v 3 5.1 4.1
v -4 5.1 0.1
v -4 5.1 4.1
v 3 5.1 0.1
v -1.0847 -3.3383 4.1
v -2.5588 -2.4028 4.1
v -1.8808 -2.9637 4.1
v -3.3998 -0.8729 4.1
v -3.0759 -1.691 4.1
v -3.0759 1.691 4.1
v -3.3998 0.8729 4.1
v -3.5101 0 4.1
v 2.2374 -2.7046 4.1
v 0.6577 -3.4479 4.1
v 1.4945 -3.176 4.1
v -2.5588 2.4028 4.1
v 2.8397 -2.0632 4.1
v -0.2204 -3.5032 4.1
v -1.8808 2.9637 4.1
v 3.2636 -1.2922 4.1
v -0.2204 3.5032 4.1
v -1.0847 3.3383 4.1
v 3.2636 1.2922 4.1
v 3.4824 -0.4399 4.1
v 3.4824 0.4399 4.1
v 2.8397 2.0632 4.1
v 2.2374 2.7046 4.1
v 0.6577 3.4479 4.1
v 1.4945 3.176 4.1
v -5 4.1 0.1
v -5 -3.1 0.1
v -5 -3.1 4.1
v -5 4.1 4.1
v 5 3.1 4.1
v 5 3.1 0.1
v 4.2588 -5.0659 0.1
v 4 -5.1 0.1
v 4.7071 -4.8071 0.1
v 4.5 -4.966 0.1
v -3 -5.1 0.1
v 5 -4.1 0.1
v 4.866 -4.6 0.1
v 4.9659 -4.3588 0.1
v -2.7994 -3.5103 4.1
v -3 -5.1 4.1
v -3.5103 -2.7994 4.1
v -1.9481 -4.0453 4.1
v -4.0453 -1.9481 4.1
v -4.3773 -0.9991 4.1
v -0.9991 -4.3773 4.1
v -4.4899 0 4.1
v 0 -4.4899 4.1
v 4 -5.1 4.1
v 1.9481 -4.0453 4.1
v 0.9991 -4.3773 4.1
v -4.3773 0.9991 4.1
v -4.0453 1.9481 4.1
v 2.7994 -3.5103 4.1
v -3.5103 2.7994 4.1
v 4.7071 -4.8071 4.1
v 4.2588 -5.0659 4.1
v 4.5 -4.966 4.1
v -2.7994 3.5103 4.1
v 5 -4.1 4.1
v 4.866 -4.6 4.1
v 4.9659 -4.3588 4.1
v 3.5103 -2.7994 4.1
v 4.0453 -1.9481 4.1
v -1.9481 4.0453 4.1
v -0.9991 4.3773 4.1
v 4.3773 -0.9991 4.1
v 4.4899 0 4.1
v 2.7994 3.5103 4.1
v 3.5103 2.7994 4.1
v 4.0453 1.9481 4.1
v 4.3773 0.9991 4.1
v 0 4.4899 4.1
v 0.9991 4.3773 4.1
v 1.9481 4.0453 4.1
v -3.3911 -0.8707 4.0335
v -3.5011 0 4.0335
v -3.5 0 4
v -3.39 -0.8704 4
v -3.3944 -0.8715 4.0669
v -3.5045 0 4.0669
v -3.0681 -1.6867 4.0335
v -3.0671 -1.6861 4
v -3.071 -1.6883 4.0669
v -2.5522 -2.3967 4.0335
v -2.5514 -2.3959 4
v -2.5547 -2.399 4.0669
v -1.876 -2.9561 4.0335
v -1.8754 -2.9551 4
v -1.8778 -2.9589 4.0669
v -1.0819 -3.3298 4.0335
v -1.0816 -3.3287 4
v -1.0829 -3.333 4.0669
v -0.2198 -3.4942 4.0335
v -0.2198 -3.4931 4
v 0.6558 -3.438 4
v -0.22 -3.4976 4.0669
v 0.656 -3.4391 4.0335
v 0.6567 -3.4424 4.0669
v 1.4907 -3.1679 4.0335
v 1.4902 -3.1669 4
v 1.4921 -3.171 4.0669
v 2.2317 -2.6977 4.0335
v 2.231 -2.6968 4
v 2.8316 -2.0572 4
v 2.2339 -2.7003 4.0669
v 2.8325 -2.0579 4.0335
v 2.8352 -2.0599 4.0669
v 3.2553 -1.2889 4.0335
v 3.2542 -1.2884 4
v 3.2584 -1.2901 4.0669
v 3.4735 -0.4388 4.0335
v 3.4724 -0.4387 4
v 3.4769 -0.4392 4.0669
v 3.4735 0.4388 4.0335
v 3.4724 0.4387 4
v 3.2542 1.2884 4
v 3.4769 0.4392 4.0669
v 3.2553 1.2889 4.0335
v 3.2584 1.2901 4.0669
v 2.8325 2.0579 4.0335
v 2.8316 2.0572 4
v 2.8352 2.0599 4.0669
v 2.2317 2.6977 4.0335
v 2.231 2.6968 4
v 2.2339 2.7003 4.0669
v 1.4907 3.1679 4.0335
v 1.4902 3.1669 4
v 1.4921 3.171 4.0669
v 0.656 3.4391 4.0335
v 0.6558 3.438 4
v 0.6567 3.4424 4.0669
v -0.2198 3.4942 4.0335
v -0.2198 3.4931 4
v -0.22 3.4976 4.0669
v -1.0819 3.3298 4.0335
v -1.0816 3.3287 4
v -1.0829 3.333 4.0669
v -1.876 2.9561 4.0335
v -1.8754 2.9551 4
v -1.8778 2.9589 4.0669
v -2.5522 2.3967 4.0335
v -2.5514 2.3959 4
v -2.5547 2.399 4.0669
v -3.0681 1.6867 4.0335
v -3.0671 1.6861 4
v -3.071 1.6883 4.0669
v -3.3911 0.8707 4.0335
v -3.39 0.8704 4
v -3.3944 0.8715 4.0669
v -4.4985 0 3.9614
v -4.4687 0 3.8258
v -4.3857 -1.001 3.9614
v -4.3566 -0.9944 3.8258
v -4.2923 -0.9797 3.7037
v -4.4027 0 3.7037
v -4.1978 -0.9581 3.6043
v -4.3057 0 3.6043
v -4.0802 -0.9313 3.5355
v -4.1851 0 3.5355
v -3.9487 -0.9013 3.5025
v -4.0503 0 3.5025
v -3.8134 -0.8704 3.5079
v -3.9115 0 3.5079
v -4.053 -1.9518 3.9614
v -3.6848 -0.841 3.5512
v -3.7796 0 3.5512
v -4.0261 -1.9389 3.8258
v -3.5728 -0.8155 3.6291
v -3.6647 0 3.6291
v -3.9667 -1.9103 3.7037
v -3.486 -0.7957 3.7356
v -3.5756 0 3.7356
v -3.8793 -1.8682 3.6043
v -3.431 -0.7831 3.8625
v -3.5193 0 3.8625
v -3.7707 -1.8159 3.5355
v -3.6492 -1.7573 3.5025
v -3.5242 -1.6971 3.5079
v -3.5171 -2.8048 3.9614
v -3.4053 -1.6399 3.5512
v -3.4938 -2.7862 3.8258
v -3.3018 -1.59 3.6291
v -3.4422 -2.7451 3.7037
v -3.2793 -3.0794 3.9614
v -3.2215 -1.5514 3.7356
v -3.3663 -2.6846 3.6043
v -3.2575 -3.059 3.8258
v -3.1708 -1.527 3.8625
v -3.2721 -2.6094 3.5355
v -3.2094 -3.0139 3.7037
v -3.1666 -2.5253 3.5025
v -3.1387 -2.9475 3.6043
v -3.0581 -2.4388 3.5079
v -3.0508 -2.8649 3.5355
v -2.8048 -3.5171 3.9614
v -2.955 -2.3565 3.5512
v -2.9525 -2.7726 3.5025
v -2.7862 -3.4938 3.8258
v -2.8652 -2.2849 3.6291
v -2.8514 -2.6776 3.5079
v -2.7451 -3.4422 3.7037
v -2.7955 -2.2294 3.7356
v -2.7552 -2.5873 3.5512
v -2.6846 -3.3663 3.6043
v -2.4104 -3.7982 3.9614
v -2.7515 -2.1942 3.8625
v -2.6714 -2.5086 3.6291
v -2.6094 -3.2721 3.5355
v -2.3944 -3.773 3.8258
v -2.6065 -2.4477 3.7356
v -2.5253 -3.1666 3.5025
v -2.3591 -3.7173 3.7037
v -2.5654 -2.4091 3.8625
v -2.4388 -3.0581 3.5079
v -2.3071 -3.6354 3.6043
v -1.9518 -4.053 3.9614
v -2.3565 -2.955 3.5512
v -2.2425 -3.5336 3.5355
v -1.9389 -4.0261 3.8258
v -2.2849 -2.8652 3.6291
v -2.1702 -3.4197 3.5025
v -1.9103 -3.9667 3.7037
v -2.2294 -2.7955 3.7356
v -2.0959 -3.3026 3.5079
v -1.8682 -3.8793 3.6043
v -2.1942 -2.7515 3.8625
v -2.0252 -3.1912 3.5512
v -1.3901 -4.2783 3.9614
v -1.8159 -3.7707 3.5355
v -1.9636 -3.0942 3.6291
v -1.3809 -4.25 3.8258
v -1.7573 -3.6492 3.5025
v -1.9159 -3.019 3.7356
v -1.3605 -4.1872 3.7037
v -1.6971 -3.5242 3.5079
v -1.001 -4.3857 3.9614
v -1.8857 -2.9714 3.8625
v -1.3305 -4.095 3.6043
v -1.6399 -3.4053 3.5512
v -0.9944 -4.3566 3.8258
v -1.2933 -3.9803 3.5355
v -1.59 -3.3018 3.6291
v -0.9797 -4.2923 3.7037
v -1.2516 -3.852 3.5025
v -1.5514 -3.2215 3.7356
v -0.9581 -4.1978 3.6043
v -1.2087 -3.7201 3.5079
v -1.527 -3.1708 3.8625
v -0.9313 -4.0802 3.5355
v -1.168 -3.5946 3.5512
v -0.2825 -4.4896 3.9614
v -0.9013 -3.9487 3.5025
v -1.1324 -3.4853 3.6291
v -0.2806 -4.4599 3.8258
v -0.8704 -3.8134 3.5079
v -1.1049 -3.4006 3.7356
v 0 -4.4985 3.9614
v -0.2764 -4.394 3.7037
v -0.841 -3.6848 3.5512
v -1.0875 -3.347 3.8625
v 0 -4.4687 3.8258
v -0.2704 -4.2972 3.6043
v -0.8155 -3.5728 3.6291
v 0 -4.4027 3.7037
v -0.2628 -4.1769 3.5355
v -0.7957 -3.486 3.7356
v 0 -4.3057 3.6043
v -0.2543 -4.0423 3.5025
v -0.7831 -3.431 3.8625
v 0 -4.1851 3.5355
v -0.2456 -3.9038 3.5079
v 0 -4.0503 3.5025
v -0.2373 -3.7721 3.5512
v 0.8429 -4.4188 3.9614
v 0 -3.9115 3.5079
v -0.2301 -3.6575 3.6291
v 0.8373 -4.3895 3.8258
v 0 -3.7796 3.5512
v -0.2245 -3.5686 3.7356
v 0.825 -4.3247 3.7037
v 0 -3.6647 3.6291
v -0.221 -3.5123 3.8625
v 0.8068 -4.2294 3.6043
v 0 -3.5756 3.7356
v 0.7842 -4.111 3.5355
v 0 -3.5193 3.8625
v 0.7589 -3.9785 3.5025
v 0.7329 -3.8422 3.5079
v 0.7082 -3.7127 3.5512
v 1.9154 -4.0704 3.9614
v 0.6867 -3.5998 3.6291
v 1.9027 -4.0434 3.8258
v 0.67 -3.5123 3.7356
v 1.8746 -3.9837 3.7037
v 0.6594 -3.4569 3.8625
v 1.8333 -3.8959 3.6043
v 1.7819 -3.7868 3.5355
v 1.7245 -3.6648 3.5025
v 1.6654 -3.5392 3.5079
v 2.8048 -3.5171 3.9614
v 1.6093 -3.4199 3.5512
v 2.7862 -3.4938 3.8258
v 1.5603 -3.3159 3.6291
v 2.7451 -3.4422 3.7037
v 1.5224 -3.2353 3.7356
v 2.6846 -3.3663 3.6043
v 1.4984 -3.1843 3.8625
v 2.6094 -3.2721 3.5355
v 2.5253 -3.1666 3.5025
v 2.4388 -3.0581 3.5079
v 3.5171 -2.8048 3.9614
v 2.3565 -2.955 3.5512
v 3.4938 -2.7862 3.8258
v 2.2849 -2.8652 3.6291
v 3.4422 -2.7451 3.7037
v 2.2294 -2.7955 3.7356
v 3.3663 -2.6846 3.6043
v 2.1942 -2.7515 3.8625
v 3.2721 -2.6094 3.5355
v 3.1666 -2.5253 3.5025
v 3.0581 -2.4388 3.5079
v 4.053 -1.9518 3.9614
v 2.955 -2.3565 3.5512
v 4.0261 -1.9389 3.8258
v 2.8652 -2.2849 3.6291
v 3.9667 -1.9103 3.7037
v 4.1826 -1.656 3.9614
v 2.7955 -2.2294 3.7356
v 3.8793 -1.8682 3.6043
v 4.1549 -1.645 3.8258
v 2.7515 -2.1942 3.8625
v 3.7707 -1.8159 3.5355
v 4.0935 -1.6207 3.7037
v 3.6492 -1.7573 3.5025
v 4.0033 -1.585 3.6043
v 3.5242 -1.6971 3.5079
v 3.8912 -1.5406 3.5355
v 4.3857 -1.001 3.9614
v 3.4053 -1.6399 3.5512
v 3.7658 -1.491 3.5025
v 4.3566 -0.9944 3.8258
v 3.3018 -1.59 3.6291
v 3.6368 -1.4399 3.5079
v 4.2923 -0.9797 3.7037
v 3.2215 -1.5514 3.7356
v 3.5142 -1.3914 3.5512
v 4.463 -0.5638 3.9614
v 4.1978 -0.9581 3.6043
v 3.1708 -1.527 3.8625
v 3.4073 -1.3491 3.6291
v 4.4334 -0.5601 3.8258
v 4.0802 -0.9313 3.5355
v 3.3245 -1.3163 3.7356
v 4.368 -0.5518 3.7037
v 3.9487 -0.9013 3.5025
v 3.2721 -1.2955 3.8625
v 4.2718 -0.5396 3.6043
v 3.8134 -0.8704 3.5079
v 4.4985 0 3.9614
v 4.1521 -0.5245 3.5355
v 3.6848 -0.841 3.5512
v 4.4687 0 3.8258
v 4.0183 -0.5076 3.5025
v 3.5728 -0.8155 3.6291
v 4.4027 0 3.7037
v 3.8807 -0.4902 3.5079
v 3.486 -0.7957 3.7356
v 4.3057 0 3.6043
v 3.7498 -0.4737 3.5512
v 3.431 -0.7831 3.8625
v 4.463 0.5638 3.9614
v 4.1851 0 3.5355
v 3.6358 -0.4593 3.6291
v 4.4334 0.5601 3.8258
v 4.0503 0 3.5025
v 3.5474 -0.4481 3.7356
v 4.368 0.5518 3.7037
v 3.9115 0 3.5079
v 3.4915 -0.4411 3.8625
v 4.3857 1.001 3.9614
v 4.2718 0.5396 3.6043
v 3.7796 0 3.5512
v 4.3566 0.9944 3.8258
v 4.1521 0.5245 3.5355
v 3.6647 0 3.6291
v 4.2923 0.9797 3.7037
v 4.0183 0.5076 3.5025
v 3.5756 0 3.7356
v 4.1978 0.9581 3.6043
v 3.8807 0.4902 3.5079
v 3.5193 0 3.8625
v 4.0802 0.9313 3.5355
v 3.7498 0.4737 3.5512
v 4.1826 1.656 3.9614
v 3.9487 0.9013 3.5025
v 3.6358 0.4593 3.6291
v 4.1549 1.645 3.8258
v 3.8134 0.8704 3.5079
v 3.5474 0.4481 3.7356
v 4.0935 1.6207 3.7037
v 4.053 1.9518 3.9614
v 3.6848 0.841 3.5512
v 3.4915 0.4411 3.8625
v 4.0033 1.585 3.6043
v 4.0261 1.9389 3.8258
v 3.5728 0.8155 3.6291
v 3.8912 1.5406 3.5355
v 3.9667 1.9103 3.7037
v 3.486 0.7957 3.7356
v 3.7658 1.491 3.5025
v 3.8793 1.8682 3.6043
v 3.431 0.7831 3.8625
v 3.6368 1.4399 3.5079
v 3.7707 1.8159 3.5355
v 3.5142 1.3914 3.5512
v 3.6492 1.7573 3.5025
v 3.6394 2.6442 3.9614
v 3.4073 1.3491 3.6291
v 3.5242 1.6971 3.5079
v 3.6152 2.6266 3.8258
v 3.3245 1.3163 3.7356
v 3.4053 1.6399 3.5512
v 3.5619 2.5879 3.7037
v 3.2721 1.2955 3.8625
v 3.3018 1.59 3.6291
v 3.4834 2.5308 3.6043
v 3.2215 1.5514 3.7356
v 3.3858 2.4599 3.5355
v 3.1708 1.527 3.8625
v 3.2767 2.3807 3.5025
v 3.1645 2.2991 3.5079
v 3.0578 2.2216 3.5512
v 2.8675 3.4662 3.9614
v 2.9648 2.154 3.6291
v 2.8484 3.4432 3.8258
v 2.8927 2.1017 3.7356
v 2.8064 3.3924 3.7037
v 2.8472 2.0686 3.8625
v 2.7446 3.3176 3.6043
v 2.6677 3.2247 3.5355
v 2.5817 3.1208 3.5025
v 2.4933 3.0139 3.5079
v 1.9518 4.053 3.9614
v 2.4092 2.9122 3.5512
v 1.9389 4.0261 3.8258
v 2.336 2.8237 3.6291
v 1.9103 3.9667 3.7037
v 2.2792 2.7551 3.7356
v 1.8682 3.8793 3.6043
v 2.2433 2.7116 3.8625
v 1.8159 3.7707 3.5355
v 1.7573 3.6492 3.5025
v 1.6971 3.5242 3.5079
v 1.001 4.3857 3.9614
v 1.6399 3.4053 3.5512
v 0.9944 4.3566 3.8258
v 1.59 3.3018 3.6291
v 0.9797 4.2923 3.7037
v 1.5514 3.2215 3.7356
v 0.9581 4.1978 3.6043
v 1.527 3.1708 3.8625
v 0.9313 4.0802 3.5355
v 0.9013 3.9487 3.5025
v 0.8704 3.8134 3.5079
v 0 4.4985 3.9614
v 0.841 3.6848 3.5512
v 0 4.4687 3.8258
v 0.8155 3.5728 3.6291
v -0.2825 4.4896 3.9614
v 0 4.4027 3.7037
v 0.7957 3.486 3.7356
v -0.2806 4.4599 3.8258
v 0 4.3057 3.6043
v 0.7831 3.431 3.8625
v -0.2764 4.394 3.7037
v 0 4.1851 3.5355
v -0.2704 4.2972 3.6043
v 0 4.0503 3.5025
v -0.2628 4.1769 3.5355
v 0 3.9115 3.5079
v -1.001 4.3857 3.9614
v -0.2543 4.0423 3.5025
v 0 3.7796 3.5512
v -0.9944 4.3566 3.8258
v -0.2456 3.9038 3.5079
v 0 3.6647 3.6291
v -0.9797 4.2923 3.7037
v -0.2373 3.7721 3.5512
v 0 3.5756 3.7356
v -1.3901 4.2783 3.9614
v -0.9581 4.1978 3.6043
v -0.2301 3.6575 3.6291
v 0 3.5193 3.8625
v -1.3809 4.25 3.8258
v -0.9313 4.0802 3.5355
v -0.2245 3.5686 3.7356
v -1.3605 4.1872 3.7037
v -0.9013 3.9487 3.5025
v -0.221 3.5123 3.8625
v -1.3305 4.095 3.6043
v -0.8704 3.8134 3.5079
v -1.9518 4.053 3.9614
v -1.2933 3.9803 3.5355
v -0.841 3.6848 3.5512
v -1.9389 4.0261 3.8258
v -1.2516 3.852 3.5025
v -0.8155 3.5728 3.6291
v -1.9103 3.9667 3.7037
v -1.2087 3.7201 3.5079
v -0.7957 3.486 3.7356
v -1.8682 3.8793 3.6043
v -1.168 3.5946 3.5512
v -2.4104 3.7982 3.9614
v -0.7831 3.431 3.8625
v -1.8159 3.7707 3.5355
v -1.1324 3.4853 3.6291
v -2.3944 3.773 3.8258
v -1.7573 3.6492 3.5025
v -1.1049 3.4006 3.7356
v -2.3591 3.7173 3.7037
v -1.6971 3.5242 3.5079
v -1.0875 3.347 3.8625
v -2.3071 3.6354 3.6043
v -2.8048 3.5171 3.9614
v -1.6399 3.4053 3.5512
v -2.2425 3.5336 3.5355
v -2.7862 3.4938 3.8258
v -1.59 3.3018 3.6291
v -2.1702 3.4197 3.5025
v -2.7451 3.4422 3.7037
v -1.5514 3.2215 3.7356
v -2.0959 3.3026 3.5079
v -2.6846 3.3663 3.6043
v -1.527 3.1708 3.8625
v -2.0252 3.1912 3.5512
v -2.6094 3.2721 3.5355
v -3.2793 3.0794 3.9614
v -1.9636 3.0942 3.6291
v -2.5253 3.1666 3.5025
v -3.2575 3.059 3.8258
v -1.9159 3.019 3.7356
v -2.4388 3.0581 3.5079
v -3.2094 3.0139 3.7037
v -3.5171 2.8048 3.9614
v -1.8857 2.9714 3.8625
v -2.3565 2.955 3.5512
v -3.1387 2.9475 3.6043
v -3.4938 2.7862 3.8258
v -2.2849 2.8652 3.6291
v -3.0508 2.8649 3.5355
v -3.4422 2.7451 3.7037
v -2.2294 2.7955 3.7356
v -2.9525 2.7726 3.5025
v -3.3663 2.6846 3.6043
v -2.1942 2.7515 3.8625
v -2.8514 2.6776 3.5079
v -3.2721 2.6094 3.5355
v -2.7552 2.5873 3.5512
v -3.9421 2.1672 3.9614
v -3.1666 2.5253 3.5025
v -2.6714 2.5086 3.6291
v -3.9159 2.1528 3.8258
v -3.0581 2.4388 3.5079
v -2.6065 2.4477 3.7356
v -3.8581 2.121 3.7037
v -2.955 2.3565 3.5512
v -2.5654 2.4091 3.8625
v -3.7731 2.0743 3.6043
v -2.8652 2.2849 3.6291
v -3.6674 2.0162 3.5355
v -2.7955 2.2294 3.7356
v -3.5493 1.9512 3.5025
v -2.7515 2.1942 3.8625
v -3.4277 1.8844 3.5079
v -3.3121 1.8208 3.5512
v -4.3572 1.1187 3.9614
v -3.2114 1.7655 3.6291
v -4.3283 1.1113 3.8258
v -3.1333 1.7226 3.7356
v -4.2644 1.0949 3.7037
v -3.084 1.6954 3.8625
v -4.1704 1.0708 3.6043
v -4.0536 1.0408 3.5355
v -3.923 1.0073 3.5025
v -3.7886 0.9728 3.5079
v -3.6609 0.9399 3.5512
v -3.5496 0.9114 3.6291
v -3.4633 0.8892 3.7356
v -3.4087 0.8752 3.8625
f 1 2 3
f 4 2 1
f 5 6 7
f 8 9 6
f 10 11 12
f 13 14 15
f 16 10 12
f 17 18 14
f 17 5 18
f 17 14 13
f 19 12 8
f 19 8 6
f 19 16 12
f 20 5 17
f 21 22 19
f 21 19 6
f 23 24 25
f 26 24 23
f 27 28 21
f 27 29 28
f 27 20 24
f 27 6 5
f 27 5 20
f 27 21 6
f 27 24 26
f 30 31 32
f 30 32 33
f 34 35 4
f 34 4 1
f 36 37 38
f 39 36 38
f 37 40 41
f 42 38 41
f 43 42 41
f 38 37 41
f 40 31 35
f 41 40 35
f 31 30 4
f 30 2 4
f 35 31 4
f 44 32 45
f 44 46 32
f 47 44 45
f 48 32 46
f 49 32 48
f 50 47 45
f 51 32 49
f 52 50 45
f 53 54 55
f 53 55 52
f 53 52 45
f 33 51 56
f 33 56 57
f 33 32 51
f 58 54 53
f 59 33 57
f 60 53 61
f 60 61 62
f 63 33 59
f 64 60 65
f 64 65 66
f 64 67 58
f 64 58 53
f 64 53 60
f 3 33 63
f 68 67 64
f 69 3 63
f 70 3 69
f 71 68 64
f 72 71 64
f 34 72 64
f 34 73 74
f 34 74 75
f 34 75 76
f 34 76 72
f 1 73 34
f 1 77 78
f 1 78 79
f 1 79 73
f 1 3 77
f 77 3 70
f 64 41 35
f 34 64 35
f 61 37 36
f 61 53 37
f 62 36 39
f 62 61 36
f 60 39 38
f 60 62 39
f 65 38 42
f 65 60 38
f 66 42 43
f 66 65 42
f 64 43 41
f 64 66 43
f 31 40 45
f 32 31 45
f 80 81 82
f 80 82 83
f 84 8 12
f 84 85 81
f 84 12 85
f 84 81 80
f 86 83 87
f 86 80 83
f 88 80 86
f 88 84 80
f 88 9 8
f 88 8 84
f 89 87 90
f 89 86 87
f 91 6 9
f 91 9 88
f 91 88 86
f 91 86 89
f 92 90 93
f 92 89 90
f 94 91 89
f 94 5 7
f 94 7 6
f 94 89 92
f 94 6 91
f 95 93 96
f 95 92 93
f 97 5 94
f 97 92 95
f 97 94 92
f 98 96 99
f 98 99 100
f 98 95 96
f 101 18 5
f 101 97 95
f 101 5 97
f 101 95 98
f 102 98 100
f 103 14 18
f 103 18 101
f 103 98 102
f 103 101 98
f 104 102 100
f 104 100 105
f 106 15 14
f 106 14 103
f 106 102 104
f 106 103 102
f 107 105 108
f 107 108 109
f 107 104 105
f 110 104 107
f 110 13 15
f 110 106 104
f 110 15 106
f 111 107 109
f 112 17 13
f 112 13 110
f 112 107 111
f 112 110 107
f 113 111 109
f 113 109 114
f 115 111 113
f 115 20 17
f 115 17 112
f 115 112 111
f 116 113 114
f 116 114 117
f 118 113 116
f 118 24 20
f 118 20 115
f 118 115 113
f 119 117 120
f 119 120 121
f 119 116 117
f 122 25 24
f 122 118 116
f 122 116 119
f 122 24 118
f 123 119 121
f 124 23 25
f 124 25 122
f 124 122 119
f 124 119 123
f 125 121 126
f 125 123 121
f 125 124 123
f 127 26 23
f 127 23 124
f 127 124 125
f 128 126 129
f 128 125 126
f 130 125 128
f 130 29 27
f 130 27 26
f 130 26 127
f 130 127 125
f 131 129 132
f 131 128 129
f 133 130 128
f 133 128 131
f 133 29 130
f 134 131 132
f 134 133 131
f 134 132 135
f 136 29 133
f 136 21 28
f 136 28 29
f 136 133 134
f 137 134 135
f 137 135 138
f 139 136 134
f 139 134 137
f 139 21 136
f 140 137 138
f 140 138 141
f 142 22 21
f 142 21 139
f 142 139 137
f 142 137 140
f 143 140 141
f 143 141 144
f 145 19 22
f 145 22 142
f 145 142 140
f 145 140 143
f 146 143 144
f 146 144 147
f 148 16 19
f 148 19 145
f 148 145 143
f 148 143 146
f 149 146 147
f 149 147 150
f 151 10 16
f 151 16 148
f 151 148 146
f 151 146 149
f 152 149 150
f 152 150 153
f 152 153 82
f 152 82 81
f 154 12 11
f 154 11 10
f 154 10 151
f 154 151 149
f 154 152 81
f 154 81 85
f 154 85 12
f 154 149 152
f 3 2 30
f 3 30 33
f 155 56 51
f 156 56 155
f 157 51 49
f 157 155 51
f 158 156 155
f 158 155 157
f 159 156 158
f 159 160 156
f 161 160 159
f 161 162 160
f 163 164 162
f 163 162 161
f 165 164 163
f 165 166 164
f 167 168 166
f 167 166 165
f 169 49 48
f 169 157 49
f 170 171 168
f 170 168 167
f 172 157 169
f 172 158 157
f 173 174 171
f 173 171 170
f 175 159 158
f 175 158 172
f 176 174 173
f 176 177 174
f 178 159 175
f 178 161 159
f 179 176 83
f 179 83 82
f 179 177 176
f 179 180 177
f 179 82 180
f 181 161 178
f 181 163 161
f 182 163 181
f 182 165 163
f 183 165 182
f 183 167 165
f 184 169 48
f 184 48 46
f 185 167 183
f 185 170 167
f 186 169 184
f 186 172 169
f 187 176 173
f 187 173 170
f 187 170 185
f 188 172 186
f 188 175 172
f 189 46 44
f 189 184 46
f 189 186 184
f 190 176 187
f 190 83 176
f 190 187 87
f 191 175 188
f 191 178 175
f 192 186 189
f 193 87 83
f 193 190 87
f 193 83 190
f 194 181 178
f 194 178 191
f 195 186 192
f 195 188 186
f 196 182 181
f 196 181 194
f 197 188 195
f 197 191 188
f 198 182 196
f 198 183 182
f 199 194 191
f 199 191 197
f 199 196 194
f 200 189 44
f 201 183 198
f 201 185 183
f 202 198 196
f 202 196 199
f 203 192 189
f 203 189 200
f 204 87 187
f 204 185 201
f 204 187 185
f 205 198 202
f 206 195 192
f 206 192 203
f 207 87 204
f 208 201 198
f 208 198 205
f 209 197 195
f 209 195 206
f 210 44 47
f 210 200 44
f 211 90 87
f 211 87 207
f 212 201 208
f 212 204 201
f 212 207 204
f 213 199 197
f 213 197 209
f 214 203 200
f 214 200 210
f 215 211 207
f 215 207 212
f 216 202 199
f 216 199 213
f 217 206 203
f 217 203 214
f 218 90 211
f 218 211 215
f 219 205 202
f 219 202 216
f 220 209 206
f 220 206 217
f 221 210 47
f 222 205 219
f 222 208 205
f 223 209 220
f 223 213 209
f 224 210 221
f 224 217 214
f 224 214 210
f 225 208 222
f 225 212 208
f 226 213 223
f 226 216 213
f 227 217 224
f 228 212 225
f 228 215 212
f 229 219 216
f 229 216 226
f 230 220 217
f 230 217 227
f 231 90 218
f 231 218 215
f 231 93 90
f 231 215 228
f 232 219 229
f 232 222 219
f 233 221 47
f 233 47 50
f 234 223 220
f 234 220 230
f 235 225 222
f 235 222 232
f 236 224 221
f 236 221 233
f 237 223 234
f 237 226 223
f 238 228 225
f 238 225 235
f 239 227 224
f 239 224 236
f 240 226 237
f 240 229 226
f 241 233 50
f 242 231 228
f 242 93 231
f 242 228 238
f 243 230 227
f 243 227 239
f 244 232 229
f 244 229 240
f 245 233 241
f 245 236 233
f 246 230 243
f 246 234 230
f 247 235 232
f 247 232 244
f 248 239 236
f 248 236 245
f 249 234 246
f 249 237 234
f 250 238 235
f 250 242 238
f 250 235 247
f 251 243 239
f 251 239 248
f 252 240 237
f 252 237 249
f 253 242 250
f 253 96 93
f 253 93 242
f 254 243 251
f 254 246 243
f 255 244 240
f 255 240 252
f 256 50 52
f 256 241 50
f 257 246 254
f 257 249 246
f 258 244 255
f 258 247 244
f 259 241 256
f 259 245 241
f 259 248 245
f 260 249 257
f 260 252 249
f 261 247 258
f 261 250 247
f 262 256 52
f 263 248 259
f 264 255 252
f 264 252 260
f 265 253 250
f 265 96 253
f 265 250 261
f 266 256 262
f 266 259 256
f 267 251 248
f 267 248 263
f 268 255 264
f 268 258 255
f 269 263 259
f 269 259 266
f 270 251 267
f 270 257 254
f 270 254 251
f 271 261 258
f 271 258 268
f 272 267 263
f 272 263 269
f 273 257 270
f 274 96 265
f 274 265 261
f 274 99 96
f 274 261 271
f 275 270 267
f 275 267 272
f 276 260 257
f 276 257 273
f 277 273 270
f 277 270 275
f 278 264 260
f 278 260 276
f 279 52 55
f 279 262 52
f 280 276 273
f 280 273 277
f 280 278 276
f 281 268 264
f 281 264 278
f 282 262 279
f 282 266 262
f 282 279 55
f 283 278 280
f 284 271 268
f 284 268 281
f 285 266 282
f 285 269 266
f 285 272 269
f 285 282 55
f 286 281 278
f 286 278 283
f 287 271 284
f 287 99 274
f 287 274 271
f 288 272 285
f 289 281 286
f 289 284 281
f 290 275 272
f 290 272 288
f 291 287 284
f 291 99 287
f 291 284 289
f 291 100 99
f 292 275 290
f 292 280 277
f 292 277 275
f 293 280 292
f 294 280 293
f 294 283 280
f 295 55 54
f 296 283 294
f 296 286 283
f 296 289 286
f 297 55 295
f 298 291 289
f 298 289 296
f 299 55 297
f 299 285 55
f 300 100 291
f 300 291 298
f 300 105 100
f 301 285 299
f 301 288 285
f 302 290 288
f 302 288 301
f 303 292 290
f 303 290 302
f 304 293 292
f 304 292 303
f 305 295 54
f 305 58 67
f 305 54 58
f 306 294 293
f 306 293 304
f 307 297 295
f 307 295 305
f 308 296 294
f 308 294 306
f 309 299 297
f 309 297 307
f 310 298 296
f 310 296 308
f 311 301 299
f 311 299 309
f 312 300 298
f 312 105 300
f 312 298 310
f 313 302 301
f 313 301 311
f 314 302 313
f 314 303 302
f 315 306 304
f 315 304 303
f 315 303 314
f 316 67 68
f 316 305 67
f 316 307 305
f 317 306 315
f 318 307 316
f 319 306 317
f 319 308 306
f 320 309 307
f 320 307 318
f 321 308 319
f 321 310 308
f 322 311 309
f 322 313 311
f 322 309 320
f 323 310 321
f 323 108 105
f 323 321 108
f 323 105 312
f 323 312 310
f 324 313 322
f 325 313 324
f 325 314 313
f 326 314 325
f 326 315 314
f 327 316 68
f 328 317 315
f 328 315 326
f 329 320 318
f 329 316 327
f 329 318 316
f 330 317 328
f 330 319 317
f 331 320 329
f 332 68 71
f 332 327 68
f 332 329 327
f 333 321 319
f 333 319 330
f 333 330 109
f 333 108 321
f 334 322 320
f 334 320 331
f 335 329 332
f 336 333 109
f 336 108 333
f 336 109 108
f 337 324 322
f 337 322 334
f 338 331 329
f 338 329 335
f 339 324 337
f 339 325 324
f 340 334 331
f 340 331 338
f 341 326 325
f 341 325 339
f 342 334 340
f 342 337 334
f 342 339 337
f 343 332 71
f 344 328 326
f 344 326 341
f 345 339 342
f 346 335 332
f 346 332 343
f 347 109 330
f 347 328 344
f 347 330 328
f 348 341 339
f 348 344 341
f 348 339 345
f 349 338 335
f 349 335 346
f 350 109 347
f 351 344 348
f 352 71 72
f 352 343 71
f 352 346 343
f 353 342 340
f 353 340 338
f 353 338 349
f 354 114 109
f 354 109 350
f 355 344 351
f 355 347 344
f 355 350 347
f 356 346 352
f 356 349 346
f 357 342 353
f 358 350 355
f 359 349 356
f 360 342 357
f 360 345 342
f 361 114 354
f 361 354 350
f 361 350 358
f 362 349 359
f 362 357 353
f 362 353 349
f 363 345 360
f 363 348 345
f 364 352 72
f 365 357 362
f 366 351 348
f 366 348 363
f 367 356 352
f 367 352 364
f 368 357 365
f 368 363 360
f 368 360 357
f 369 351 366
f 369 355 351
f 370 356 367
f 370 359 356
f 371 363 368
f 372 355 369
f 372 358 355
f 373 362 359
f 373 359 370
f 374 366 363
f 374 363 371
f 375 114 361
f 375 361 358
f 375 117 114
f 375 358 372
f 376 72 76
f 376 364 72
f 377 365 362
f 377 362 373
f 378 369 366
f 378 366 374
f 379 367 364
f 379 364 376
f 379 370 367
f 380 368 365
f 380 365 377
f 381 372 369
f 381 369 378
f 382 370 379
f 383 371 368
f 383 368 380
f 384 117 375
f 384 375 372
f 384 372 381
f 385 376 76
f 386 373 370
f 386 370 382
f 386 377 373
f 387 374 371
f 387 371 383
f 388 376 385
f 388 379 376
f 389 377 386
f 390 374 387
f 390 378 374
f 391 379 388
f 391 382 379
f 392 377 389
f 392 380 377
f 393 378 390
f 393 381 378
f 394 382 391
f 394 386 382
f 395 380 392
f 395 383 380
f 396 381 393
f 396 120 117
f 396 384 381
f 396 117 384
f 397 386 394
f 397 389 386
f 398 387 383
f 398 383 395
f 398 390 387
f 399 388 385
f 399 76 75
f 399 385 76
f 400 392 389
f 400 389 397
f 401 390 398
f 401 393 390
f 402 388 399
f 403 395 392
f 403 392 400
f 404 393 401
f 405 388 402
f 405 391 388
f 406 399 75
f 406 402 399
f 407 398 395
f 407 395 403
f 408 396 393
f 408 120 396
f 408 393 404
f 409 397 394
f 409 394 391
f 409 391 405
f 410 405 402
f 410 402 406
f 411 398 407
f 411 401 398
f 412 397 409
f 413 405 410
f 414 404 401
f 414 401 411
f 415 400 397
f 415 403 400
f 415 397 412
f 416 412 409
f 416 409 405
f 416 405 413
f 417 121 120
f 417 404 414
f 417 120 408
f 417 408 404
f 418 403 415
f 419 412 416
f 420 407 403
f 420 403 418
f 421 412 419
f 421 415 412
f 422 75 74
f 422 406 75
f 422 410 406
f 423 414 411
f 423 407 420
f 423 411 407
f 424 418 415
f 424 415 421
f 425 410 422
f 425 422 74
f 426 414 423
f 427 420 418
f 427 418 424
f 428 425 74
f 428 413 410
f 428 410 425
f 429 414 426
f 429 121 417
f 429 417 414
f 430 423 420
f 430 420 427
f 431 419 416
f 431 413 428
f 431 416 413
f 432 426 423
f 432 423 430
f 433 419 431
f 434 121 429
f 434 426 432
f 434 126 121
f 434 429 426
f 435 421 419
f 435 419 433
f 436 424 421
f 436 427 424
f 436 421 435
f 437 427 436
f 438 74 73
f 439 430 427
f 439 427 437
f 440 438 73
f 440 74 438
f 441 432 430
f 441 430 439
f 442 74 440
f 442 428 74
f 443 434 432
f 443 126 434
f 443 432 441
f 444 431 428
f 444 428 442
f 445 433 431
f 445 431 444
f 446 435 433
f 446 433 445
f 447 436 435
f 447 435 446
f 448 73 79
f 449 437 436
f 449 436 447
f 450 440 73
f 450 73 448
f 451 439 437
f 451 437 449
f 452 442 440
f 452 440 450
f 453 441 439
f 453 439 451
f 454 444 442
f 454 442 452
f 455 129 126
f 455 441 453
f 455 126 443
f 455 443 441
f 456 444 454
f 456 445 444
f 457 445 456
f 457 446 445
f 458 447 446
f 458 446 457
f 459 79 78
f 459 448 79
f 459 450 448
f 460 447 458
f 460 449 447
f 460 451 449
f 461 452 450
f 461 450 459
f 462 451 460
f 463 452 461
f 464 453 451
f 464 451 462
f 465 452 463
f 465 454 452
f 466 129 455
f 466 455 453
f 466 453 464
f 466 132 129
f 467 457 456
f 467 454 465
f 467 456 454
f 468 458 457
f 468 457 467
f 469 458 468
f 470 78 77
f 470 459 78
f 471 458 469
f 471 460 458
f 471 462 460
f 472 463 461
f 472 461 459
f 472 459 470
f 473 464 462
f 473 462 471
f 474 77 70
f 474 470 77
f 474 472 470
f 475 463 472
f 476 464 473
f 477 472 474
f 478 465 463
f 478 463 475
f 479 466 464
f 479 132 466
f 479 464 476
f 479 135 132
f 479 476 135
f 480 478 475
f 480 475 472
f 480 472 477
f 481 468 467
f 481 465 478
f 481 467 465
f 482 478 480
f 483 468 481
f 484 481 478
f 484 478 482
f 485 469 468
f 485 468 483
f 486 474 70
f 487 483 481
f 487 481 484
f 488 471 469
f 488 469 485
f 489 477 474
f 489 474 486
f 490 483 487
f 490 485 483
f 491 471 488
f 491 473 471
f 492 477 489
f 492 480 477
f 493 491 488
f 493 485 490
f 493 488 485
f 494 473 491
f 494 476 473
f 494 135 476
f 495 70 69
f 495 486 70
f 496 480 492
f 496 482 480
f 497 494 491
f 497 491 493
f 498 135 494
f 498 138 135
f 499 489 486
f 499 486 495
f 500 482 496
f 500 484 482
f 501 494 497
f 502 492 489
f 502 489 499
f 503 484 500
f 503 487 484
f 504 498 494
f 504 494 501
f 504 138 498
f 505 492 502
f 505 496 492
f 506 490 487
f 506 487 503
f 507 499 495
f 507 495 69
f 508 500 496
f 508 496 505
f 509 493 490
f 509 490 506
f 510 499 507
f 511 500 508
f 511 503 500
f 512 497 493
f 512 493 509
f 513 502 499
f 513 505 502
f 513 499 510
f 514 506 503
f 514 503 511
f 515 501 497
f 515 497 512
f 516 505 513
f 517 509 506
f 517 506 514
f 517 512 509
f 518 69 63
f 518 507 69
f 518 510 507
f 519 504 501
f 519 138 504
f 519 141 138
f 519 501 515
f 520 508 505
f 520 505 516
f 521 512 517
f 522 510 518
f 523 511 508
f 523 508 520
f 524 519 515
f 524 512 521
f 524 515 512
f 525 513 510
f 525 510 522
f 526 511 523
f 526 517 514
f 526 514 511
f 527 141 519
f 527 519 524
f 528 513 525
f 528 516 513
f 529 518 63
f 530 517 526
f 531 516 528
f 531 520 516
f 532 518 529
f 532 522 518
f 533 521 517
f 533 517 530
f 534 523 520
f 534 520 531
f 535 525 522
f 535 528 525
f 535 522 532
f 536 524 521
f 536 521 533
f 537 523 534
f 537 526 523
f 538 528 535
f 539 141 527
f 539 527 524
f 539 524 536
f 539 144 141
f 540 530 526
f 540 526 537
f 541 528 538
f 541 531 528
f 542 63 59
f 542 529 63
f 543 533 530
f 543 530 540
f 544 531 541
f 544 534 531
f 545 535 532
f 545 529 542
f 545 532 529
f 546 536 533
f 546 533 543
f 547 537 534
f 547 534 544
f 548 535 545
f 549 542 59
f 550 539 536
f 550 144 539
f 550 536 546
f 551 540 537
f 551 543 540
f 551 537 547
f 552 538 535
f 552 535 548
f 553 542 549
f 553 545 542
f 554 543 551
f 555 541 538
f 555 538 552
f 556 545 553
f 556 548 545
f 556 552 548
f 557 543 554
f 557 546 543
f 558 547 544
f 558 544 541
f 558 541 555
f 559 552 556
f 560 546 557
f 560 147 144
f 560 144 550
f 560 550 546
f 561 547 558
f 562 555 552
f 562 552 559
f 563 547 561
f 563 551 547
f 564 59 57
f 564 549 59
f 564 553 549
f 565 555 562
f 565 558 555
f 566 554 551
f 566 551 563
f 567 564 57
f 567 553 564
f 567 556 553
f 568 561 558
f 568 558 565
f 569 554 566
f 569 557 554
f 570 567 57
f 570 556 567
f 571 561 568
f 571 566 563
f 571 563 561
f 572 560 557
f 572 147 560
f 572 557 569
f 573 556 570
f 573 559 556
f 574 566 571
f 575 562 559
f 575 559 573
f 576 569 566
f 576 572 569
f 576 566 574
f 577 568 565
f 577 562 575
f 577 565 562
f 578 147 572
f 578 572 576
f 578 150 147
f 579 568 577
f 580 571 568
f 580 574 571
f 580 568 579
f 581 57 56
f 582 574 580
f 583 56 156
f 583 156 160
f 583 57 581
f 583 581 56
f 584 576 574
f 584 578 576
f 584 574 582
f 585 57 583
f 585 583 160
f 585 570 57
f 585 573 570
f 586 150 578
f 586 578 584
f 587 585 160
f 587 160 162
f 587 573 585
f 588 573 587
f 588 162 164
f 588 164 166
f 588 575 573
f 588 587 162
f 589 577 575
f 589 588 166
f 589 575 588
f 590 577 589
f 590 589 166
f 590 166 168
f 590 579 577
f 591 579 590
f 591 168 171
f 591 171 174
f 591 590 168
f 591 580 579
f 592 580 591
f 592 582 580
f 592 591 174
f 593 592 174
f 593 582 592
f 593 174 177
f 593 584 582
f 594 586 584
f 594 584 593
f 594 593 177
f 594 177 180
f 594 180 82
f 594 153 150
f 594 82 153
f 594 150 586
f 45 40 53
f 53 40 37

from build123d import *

# Parameters (mm, degrees)
SKETCH_W        = 10
SKETCH_H        = 10.2
PAD_DEPTH       = 4
FILLET_R        = 1
CHAMFER_SIZE    = 1
CHAMFER001_SIZE = 2
SKETCH002_R     = 0.5


with BuildPart() as part:
    # Sketch → Pad (new body)
    with BuildSketch(Plane.XY.offset(0.1)):
        Rectangle(SKETCH_W, SKETCH_H)
    extrude(amount=PAD_DEPTH)

    # Fillet
    fillet_edges = [part.edges().sort_by_distance(p)[0] for p in [
        (5, -5.1, 2.1),
    ]]
    fillet(fillet_edges, radius=FILLET_R)

    # Chamfer
    chamfer_edges = [part.edges().sort_by_distance(p)[0] for p in [
        (-5, 5.1, 2.1),
    ]]
    chamfer(chamfer_edges, length=CHAMFER_SIZE)

    # Chamfer001
    chamfer001_edges = [part.edges().sort_by_distance(p)[0] for p in [
        (5, 5.1, 2.1),
        (-5, -5.1, 2.1),
    ]]
    chamfer(chamfer001_edges, length=CHAMFER001_SIZE)

    # Sketch002 → Groove (revolve, cut)
    with BuildSketch(Plane.XZ):
        with Locations((-4, 4)):
            Circle(SKETCH002_R)
    revolve(axis=Axis((0, 0, 0), (0, 0, 1)), mode=Mode.SUBTRACT)


solid = part.part
